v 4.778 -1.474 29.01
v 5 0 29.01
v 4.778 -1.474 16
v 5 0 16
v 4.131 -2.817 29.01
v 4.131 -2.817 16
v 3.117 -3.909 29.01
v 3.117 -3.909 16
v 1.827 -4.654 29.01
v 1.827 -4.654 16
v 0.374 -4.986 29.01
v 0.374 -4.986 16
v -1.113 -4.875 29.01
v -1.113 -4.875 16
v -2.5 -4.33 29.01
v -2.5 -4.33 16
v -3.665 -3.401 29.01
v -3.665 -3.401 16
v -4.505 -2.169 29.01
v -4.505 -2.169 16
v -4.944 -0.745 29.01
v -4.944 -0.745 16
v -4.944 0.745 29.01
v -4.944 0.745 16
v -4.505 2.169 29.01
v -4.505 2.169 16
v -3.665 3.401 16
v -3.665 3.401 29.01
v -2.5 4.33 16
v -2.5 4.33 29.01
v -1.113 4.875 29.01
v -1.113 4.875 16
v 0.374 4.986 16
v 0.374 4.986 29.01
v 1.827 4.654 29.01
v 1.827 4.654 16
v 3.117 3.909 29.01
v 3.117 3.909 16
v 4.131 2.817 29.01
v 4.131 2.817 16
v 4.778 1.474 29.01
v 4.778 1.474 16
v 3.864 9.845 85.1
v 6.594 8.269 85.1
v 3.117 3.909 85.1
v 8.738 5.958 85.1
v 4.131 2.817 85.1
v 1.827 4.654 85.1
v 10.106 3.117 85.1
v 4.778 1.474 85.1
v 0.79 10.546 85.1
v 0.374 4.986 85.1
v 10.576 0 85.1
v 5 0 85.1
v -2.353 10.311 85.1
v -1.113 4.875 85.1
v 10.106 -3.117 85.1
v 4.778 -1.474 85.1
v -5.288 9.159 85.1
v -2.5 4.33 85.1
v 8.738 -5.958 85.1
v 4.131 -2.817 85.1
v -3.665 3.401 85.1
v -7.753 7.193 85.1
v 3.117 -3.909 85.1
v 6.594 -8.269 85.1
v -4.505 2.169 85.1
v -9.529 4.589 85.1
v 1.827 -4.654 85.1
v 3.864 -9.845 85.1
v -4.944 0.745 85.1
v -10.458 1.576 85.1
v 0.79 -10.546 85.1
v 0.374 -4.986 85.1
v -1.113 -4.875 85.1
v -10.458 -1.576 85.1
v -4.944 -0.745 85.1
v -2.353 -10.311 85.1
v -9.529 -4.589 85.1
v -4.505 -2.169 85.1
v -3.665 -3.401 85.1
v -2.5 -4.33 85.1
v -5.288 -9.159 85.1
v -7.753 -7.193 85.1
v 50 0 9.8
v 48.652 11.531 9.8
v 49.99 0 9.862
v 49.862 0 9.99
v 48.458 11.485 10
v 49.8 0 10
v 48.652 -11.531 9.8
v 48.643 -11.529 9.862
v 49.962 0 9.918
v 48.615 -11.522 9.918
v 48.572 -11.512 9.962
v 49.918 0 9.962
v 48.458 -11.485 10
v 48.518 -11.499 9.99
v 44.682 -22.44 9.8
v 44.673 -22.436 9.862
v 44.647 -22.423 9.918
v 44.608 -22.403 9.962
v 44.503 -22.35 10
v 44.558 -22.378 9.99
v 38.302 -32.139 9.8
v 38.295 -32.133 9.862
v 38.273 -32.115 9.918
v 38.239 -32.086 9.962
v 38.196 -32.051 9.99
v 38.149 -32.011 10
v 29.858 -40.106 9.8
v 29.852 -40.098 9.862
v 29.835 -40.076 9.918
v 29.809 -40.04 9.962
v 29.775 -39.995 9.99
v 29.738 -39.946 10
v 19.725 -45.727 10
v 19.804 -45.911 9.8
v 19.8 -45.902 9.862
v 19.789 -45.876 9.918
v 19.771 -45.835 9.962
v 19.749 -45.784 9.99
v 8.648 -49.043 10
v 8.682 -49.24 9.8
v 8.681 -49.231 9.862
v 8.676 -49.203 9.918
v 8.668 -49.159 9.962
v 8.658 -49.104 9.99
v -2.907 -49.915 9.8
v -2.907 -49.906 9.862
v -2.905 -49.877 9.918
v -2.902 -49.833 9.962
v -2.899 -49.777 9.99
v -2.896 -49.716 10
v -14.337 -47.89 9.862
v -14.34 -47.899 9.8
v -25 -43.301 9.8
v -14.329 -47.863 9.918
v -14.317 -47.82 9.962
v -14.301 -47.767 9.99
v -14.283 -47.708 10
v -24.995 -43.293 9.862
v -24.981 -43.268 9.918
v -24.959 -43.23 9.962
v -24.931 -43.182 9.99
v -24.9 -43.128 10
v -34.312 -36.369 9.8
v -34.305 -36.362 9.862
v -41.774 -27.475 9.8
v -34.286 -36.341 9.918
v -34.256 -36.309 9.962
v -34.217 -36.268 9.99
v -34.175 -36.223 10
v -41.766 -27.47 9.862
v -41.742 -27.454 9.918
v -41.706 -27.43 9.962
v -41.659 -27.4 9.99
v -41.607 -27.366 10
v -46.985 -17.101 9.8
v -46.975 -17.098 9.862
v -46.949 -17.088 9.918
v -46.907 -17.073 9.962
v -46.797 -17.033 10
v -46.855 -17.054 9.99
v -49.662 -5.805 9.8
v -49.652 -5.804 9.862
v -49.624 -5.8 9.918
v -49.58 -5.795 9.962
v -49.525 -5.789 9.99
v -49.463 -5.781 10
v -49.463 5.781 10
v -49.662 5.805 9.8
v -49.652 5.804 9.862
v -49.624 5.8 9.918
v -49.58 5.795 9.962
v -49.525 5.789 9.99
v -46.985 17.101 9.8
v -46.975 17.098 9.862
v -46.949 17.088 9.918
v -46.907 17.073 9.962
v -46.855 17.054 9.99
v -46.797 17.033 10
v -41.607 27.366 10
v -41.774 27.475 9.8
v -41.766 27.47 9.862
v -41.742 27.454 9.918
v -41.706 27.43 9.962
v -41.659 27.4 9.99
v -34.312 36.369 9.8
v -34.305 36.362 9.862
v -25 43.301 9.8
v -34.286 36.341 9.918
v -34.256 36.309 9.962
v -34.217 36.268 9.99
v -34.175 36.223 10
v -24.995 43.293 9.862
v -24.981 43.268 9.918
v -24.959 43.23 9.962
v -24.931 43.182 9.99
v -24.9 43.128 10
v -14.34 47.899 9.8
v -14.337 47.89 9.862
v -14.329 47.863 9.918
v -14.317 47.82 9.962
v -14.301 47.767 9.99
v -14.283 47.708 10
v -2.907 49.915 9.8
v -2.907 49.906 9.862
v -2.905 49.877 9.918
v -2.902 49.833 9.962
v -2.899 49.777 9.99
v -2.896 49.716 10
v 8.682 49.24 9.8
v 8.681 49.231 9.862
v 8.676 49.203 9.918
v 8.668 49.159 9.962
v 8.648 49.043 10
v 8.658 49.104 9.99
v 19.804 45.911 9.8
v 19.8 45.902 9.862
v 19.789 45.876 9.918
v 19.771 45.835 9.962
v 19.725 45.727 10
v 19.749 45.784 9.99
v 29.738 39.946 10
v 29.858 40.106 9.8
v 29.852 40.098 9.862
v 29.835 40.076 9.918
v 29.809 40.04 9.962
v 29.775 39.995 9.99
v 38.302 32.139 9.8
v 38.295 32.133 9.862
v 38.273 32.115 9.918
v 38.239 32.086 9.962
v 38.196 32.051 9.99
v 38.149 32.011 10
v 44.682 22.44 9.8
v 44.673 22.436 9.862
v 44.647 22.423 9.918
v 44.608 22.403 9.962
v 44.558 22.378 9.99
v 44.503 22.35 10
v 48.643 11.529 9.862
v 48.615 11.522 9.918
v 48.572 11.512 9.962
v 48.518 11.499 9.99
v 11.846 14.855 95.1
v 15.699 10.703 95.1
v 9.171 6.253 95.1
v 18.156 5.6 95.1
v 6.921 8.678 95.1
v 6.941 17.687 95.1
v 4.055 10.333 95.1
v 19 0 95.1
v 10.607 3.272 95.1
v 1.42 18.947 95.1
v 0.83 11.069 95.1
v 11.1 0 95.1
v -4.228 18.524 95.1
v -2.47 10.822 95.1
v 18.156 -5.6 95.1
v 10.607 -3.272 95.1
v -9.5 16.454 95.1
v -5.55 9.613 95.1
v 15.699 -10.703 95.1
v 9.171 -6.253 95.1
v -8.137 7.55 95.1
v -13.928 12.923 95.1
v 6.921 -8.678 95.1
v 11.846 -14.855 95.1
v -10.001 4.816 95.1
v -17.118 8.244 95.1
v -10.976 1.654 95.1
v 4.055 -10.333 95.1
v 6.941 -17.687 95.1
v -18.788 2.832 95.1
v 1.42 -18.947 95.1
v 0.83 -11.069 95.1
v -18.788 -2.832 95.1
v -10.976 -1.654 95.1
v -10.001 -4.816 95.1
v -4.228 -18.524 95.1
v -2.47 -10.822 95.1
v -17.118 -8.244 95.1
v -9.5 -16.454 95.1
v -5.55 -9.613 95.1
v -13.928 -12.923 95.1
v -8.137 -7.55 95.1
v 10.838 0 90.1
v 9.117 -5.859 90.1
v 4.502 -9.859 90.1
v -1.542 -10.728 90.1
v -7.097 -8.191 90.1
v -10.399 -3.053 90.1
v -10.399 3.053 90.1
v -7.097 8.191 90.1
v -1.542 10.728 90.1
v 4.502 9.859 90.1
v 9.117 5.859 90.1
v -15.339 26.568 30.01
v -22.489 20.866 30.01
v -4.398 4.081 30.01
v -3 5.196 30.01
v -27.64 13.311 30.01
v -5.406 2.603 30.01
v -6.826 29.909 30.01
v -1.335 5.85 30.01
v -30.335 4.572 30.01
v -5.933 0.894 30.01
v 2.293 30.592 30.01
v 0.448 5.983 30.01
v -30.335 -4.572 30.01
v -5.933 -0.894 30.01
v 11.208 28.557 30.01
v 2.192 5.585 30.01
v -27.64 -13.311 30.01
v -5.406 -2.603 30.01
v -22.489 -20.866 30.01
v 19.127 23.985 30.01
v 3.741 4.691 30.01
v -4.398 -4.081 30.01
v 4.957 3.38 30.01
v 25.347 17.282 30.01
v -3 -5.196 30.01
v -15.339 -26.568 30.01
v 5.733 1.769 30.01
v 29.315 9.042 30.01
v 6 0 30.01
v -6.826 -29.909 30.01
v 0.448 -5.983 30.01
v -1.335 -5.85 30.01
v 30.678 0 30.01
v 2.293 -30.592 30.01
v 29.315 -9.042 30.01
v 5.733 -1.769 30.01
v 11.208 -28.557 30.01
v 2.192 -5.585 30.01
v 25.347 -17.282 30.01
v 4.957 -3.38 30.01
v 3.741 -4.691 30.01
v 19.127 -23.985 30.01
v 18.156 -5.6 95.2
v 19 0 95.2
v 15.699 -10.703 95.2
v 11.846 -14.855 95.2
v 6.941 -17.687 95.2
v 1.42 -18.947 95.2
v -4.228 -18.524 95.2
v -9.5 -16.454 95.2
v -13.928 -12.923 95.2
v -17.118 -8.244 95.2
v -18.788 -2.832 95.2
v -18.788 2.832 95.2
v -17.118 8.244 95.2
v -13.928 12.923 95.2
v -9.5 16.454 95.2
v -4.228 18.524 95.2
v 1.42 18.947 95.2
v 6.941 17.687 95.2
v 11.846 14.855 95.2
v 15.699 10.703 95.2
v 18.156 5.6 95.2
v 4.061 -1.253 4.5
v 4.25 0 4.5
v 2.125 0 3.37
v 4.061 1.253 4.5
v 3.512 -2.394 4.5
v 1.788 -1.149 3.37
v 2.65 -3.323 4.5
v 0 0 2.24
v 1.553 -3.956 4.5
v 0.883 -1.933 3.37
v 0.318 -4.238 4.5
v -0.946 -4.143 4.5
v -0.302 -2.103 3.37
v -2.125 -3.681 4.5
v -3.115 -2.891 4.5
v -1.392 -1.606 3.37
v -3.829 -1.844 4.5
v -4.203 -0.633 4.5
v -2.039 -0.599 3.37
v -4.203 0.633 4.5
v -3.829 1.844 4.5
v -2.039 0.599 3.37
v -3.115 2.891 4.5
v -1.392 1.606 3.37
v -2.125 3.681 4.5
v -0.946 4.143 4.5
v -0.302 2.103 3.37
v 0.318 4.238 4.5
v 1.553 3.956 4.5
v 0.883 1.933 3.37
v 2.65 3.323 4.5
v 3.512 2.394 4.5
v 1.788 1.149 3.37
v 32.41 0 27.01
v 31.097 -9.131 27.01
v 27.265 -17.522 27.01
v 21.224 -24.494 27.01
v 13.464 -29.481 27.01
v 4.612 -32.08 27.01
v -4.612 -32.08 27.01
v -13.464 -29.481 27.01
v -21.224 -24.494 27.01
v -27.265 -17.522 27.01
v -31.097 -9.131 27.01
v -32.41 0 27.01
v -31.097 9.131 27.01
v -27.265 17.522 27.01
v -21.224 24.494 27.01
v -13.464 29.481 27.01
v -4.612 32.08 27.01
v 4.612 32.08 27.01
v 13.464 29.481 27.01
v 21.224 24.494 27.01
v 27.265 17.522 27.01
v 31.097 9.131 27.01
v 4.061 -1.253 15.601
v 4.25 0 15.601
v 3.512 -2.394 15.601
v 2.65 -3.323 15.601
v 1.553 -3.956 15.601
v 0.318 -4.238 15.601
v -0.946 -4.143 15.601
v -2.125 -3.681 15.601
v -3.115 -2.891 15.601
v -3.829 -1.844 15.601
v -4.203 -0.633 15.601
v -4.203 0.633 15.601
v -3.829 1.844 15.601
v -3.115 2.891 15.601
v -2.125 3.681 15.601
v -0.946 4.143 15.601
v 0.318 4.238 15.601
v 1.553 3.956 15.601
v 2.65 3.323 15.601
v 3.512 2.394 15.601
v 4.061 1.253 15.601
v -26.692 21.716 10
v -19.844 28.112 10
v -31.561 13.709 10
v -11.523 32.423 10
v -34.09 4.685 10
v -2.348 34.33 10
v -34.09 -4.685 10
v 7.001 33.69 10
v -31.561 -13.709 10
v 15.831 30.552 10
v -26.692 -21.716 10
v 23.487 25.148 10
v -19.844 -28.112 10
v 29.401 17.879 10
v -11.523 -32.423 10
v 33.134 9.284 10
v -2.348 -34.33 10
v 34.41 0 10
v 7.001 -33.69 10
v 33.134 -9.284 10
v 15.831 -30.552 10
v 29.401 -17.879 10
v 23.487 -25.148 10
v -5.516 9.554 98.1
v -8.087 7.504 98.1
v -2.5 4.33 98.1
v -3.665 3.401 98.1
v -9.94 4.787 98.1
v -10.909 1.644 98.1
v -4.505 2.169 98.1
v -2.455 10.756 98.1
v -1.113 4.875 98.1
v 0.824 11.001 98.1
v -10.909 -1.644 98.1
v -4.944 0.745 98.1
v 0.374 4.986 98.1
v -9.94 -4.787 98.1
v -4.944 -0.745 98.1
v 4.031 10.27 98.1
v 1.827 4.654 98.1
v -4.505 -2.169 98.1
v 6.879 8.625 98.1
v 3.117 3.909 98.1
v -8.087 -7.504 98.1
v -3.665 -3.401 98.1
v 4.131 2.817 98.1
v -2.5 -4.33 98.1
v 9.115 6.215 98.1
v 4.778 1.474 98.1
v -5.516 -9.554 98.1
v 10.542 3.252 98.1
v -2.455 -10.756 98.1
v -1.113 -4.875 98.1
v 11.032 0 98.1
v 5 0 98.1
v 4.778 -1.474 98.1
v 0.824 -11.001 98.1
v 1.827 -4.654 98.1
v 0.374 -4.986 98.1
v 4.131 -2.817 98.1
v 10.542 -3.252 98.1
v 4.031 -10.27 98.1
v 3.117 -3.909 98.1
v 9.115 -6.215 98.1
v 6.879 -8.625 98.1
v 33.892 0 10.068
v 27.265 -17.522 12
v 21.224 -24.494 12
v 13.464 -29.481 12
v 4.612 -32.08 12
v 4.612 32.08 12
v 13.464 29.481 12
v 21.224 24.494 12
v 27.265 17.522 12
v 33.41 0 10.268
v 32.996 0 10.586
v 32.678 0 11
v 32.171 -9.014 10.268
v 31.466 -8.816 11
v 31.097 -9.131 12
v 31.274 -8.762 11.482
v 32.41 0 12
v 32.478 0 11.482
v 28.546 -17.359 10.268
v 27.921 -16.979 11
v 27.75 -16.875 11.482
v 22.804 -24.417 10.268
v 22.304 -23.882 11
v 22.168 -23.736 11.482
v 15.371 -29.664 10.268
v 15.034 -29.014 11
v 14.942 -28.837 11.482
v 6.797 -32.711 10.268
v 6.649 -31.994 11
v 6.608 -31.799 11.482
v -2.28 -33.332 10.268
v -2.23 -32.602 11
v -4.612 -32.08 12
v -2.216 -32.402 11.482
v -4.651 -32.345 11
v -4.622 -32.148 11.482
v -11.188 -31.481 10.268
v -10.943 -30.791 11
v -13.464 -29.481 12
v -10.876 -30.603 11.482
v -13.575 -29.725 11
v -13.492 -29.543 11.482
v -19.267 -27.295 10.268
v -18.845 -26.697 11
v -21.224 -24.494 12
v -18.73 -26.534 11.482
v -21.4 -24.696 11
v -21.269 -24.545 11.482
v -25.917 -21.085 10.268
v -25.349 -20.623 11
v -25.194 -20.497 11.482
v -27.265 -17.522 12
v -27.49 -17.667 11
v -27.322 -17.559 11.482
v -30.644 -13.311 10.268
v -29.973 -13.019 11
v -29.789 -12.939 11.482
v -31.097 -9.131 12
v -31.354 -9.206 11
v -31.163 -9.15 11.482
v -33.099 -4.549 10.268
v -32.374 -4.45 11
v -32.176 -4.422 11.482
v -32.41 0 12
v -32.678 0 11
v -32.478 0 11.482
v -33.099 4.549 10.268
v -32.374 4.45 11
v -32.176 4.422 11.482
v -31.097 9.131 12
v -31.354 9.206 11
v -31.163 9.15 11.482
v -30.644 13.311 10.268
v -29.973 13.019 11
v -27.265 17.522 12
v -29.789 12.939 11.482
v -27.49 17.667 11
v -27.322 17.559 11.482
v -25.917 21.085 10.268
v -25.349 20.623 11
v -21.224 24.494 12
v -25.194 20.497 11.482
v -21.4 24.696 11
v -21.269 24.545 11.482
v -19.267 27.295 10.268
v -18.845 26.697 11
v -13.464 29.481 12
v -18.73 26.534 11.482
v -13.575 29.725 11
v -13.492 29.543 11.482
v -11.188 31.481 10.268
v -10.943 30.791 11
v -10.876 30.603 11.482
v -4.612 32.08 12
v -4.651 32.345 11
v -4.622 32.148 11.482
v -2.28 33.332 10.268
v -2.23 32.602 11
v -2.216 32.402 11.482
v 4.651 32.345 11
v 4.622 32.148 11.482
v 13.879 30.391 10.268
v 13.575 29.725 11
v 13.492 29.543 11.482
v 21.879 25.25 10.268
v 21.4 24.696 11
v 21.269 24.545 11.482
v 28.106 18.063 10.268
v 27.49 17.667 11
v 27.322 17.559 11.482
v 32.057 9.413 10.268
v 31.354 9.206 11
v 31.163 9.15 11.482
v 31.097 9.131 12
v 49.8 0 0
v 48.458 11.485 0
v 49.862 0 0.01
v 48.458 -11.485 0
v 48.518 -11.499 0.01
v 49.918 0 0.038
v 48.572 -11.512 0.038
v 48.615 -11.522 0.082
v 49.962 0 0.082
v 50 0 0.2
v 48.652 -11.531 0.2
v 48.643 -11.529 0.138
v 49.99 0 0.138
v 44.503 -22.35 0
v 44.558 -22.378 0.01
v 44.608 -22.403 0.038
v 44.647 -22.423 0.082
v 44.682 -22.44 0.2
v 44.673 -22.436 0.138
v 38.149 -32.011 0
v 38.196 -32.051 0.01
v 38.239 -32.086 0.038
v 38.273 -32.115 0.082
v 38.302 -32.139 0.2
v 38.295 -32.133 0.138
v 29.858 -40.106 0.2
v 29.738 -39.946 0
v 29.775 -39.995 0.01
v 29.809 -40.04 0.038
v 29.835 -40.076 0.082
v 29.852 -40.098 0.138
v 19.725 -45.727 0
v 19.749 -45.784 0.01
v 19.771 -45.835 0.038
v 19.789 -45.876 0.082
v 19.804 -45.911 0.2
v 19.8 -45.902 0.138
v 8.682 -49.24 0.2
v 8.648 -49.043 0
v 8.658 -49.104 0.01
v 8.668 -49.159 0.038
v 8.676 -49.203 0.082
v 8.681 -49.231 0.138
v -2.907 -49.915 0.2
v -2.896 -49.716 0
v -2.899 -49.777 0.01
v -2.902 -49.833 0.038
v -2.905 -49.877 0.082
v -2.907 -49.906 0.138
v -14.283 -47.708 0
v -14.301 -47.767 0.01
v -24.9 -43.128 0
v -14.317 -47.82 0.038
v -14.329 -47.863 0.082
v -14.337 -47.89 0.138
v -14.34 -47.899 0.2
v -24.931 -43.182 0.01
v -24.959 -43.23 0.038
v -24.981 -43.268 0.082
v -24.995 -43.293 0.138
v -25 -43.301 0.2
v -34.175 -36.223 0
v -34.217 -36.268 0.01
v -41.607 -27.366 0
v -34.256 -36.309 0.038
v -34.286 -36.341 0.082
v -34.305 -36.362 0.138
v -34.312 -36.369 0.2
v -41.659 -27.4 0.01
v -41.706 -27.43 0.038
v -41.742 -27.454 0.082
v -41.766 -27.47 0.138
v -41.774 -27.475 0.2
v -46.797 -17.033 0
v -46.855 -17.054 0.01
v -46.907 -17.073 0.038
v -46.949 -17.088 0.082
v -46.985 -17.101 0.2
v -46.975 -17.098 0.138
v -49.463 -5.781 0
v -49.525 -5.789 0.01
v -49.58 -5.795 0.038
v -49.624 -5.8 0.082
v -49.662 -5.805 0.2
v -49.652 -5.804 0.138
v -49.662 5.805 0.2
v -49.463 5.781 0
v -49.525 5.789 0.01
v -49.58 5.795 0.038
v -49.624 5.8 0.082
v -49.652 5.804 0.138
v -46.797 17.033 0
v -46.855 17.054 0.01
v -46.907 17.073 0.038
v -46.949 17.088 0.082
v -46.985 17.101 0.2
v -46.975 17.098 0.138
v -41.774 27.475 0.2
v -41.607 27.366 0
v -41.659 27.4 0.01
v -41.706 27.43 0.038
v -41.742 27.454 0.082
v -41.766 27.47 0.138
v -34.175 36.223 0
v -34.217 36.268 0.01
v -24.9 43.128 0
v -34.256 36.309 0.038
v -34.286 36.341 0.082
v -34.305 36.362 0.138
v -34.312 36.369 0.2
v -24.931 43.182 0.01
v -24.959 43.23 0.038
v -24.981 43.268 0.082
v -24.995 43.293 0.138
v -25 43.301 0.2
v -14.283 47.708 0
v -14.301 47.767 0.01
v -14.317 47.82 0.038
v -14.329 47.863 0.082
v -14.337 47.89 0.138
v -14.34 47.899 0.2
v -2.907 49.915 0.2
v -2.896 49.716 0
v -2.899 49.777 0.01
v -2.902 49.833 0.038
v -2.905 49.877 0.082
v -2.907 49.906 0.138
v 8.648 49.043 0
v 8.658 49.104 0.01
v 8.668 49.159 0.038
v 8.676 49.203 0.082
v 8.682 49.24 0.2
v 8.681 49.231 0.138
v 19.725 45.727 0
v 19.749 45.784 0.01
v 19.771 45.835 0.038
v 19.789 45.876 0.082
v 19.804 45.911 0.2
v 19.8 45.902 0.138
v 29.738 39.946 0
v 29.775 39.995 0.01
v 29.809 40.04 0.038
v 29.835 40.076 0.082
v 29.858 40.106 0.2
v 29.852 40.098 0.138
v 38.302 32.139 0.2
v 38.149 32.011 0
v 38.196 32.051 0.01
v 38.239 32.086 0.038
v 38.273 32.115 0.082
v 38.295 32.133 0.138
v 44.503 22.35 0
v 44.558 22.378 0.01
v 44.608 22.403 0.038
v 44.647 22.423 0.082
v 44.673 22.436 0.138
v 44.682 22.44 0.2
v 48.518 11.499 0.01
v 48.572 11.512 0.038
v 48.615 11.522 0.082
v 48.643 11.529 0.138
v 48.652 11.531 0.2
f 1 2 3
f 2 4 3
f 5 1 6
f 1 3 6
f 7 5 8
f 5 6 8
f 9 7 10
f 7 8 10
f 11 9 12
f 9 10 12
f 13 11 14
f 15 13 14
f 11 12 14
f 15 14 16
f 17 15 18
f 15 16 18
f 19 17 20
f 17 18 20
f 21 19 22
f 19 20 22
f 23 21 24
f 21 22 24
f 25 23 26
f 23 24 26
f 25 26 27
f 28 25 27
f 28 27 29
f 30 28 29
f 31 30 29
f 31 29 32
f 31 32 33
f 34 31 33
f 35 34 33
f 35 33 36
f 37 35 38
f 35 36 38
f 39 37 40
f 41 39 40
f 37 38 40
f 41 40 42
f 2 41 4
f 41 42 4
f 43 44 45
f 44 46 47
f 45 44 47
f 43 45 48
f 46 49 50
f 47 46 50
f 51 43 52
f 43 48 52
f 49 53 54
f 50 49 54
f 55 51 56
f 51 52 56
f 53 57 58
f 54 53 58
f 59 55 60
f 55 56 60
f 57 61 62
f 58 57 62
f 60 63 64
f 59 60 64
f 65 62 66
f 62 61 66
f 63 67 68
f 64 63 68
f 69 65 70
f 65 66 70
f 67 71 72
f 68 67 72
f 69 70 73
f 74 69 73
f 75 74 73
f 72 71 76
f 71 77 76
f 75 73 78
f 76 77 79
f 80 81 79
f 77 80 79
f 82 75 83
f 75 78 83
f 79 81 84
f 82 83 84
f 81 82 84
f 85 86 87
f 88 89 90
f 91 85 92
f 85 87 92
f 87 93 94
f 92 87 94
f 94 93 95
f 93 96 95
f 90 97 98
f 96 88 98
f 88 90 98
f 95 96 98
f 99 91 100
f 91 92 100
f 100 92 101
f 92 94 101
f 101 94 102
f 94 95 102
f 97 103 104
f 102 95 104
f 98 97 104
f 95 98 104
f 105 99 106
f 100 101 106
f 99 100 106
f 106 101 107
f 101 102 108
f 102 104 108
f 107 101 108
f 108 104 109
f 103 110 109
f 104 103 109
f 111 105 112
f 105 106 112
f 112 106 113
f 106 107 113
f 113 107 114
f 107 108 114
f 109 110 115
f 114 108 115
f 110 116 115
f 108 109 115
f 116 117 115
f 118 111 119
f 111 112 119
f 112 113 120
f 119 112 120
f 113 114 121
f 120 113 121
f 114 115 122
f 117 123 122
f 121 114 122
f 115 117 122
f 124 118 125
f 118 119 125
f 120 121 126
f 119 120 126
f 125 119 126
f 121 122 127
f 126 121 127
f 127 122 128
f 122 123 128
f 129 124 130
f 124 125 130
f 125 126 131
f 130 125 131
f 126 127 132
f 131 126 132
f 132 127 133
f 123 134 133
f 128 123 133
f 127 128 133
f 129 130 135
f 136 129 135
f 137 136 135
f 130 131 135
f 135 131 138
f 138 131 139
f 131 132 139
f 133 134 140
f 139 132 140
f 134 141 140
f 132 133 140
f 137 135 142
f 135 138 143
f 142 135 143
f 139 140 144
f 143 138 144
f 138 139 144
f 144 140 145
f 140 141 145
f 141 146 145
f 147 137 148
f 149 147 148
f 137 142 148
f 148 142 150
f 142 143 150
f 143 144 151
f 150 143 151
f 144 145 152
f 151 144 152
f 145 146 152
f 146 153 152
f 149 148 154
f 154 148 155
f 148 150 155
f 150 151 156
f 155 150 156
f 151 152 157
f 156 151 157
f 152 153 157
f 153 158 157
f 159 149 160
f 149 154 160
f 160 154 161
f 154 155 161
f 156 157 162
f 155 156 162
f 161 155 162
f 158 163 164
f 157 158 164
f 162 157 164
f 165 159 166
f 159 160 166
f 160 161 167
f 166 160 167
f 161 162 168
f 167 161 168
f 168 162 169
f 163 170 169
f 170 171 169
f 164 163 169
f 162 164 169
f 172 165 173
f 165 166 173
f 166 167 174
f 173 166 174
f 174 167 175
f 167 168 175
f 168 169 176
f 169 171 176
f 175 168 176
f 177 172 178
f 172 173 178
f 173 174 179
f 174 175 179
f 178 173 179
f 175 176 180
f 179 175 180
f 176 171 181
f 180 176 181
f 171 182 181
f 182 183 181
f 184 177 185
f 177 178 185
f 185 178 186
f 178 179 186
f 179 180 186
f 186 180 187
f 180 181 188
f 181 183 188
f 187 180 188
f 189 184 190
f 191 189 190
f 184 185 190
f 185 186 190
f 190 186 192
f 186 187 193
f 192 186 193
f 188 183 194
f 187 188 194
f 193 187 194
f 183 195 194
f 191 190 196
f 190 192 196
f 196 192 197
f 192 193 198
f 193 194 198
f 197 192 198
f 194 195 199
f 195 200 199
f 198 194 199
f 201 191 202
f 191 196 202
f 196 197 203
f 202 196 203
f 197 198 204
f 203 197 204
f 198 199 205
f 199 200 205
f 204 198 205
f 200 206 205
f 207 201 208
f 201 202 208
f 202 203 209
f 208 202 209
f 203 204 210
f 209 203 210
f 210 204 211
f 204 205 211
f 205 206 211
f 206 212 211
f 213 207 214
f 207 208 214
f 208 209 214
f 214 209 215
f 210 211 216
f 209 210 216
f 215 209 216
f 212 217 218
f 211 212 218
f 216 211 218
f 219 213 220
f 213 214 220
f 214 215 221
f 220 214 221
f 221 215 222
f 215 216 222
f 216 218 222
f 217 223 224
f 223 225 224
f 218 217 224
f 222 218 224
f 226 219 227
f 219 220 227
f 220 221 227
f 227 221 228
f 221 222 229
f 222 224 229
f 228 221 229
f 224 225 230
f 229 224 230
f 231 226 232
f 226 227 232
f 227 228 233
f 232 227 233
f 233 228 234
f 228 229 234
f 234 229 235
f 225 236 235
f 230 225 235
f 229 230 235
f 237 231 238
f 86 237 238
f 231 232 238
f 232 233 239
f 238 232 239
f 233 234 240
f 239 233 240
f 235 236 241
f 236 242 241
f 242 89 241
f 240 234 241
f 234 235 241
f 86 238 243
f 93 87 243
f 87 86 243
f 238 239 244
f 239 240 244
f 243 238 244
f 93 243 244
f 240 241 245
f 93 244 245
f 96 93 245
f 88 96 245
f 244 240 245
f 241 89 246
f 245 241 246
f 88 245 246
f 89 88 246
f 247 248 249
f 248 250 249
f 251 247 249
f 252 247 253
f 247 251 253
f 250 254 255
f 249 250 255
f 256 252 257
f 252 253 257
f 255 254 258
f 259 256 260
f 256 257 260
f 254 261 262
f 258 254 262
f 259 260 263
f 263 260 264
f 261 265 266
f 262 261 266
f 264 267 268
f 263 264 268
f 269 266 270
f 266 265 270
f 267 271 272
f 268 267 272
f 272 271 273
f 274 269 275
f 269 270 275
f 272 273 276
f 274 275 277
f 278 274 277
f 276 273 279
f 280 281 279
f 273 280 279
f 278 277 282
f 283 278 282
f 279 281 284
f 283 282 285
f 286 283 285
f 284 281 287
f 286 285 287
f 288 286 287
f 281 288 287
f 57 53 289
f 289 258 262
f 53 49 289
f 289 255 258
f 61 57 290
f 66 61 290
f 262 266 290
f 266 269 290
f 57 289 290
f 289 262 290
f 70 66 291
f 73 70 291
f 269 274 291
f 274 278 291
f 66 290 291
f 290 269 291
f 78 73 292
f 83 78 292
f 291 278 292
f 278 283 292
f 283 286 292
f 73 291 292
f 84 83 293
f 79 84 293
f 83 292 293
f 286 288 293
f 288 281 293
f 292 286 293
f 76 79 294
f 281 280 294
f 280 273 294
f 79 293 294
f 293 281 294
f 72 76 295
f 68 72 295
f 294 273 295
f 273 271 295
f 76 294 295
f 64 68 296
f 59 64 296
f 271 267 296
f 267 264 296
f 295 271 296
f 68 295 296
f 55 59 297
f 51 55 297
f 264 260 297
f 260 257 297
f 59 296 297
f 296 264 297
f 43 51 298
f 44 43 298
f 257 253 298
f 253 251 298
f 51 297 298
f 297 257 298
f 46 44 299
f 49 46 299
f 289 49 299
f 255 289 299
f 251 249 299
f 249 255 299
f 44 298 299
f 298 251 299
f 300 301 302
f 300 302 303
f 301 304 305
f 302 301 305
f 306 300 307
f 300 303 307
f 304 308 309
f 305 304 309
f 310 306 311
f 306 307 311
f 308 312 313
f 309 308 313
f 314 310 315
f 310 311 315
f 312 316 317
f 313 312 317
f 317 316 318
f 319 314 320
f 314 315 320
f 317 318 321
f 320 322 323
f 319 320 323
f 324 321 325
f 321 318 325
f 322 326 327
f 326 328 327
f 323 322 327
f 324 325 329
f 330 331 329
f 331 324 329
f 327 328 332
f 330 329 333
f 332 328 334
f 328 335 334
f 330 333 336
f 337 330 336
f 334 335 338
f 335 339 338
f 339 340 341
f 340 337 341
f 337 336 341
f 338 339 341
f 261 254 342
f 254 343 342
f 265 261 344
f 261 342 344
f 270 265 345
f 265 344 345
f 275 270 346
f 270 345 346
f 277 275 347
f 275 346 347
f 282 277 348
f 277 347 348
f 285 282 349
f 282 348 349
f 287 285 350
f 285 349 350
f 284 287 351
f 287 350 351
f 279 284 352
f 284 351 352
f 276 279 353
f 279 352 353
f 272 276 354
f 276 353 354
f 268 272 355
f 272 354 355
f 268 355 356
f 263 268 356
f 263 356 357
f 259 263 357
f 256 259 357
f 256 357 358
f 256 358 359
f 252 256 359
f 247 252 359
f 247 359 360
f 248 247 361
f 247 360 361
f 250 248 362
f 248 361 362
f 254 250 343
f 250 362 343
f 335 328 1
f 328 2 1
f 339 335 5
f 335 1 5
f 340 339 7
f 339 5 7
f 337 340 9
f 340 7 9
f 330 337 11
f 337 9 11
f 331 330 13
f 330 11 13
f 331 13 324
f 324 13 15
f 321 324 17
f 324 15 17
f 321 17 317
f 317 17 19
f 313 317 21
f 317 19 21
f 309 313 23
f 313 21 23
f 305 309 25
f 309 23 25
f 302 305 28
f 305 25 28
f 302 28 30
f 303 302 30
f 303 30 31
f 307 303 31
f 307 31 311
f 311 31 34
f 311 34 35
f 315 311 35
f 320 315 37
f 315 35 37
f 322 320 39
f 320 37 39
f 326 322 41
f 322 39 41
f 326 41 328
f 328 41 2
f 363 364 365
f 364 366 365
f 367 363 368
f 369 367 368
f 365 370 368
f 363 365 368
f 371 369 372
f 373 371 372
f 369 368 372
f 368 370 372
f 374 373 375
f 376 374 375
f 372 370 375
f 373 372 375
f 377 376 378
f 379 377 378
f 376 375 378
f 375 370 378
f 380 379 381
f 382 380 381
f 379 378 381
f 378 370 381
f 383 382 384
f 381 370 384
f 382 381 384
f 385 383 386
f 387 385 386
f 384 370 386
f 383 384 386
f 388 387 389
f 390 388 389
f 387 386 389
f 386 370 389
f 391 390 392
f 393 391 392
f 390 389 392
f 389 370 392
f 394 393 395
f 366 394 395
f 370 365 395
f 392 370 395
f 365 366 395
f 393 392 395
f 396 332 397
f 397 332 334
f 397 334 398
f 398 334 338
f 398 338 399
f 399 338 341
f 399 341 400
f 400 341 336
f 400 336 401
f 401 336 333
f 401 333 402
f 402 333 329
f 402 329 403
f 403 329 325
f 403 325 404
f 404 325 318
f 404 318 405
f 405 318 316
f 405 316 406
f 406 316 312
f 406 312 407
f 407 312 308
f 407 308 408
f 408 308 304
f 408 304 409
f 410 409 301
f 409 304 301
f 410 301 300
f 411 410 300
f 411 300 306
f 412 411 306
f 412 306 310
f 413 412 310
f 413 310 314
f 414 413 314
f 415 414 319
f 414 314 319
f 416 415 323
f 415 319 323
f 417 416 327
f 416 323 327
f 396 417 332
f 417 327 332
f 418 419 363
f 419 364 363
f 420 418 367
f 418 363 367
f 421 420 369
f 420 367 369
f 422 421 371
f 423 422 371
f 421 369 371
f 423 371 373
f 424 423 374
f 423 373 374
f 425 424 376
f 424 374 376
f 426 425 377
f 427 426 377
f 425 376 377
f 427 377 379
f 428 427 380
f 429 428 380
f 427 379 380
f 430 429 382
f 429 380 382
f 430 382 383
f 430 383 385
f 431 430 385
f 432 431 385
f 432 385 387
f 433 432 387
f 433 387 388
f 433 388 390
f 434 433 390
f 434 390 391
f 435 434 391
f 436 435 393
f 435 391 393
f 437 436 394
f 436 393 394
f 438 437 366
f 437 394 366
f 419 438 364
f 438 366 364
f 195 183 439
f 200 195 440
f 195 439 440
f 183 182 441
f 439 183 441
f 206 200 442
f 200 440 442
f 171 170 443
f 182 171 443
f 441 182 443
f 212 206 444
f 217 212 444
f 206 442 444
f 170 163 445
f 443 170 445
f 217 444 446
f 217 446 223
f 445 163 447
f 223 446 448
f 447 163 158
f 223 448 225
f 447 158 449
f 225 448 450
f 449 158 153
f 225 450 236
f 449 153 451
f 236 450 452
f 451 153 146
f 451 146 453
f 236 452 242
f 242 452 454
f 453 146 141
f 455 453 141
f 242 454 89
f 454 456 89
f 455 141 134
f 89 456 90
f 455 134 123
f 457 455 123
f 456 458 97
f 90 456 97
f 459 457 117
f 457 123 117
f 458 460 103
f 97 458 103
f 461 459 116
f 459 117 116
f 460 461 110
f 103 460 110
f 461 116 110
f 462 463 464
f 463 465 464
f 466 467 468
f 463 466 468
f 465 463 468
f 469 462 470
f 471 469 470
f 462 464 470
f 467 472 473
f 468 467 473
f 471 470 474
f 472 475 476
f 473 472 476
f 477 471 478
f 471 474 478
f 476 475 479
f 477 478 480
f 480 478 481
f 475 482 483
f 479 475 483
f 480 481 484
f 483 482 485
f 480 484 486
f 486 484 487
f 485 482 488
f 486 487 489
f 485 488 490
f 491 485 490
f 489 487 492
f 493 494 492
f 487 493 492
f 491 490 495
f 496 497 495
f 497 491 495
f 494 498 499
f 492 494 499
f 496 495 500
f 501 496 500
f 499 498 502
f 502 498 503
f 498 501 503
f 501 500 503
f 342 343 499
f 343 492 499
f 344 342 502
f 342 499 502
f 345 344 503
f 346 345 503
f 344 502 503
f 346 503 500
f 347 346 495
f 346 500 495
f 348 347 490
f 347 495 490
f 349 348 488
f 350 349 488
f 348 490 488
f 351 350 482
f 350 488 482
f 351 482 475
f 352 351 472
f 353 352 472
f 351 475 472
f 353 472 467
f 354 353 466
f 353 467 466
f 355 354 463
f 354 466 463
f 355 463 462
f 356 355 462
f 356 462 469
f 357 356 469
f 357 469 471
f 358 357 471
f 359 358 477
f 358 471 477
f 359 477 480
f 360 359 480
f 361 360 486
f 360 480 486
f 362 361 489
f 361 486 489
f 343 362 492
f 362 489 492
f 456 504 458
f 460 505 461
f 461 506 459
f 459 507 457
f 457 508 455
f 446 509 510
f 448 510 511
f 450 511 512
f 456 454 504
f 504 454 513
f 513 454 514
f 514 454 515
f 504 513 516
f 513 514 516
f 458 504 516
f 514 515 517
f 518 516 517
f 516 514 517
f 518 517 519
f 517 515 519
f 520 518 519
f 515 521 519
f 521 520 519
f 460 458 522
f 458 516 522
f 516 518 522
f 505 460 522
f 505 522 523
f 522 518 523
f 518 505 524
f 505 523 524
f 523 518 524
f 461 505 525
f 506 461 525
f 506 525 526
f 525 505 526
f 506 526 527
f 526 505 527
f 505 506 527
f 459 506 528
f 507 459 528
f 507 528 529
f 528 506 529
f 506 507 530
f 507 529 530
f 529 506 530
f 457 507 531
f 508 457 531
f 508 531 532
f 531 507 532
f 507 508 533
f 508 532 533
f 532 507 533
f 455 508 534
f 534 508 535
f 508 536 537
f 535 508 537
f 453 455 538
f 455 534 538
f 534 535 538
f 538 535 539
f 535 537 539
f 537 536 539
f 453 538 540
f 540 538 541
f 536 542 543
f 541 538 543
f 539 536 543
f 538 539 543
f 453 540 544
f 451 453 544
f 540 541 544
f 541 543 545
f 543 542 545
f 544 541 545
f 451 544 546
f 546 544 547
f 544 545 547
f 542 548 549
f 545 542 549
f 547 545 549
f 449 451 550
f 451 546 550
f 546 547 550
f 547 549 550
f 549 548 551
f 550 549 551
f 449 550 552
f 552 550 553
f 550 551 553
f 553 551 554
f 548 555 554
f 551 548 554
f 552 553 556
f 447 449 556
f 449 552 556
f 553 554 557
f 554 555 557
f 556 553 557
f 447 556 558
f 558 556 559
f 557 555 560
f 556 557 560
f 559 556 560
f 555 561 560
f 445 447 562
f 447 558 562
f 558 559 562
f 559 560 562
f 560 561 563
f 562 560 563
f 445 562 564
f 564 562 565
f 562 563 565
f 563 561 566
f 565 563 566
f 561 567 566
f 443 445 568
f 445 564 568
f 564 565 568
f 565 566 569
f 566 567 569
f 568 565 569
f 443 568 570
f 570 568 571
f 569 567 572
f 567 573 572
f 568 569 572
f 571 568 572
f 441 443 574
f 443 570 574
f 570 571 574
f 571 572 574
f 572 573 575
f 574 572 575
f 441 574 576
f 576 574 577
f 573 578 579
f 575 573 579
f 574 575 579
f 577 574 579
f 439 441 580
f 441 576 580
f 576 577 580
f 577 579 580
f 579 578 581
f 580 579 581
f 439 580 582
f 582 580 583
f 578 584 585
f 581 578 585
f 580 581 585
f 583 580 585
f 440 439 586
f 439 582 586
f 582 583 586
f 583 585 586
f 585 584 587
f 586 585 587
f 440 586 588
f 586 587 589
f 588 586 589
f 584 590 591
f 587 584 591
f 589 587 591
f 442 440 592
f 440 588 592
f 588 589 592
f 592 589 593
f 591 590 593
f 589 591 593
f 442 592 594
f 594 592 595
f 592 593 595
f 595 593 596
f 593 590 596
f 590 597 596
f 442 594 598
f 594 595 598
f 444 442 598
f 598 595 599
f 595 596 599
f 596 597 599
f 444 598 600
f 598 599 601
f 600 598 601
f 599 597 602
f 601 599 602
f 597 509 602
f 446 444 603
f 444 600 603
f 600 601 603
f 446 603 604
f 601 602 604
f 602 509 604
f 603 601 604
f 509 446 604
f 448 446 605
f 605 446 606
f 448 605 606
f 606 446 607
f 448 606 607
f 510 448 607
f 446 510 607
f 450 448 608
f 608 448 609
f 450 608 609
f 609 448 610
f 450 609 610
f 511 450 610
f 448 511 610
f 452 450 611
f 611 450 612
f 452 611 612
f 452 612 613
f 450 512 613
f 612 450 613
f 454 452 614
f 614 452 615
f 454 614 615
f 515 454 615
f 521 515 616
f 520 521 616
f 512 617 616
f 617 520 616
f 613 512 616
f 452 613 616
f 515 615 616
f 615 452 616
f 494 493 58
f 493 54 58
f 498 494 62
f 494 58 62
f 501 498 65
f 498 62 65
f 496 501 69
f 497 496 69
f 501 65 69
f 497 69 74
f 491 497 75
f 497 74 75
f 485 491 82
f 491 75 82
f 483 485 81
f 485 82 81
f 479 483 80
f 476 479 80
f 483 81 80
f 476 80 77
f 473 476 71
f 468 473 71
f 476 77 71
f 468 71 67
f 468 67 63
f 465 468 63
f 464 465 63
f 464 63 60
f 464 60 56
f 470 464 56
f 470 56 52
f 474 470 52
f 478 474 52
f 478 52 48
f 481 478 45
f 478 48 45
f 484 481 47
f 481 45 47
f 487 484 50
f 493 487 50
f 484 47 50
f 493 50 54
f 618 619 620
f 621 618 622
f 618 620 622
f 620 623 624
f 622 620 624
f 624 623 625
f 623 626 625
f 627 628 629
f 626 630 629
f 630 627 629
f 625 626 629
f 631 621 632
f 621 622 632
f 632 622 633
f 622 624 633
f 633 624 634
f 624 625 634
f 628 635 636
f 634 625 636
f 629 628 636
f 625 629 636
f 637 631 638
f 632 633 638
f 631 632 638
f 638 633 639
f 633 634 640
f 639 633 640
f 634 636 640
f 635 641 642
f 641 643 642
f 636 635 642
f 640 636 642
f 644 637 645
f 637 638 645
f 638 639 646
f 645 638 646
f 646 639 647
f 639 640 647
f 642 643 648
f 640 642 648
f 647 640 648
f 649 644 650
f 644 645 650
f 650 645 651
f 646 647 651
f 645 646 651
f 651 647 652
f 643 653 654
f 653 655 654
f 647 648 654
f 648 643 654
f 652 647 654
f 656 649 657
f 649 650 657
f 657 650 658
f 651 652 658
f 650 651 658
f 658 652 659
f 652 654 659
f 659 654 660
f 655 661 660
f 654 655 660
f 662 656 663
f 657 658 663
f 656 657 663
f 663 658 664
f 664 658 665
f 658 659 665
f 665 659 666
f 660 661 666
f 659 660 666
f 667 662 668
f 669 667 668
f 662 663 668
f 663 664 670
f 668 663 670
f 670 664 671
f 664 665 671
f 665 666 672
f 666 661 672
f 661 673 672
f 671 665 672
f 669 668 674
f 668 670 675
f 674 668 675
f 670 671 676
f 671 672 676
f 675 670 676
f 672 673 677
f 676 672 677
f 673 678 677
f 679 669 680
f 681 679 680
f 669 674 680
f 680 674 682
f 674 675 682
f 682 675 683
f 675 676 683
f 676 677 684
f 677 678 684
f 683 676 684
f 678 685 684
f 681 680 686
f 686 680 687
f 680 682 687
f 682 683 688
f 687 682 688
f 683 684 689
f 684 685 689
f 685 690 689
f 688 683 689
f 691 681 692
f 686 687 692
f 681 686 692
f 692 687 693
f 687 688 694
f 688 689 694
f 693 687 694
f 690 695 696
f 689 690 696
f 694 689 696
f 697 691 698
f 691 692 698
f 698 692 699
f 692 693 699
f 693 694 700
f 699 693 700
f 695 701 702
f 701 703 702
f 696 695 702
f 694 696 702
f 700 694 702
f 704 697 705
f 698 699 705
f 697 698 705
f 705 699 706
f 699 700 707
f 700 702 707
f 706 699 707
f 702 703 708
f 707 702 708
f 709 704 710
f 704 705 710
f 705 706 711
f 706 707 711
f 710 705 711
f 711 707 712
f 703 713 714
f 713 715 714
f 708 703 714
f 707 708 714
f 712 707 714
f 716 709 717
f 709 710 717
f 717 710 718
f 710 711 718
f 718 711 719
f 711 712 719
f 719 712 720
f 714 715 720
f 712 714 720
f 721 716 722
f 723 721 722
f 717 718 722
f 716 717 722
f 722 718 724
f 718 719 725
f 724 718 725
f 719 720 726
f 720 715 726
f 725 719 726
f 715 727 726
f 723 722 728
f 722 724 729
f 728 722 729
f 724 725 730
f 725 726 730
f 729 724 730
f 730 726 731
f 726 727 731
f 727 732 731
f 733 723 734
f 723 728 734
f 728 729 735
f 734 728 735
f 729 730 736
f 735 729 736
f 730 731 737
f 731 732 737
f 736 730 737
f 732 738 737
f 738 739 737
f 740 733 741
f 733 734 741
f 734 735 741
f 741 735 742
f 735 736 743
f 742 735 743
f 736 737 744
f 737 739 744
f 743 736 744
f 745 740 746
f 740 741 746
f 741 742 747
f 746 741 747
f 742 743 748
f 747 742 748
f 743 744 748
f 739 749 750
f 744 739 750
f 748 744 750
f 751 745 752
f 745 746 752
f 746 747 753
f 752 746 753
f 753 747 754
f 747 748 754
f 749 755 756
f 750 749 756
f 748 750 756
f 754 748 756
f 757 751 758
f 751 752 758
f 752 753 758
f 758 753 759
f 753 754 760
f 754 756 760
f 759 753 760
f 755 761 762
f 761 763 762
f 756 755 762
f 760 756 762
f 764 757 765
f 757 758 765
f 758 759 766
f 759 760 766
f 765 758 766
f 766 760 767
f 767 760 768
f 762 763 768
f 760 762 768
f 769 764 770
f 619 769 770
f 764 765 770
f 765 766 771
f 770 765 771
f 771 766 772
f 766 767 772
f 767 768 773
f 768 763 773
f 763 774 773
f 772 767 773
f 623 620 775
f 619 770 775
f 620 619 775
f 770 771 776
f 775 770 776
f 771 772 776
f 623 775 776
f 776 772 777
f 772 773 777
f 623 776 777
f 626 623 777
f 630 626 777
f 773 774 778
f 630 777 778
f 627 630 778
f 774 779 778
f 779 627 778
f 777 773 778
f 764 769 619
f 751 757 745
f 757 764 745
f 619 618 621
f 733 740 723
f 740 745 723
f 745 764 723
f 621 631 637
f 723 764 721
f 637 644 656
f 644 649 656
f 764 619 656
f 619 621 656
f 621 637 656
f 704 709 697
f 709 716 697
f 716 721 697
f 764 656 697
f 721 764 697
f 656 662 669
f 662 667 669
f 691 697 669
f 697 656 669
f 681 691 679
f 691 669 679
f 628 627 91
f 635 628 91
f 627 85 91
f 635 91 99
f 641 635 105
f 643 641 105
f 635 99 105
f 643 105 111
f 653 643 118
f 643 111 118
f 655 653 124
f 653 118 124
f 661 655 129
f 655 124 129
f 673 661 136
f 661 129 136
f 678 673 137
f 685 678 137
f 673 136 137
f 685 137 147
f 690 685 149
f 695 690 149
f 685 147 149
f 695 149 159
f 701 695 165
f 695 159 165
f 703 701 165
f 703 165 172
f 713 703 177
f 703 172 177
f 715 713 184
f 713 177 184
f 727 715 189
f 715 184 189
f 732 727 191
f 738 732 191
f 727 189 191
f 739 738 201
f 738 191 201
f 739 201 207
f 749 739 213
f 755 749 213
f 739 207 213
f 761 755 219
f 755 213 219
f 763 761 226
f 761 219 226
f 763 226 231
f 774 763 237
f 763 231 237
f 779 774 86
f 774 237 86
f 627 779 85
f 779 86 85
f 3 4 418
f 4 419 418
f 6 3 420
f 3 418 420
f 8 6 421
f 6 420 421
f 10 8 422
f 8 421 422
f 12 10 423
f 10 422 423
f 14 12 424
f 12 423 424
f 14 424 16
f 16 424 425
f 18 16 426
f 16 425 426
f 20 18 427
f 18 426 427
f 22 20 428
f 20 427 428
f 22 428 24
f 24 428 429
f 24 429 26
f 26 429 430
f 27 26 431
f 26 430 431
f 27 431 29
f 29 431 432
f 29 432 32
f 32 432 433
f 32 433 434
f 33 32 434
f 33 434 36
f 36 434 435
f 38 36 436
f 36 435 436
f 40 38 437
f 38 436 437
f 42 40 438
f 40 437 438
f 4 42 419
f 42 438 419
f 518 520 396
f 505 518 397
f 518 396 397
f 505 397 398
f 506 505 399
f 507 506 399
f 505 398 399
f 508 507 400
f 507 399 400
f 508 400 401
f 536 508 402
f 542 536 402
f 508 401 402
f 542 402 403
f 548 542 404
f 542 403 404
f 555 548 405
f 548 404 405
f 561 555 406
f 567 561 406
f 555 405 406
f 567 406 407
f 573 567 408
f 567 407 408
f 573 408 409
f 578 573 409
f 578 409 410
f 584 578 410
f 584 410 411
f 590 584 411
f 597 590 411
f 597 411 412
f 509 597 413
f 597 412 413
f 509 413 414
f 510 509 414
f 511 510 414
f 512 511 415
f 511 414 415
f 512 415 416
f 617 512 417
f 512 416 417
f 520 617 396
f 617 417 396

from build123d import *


with BuildPart() as f1:
    # F0 (on Front) → F1 (revolve)
    with BuildSketch(Plane.XZ):
        with BuildLine():
            Line((4.25, 4.5), (0, 2.240235))
            Line((0, 2.240235), (0, 0))
            Line((0, 0), (49.8, 0))
            ThreePointArc((49.8, 0), (49.941421, 0.058579), (50, 0.2))
            Line((50, 0.2), (50, 9.8))
            ThreePointArc((50, 9.8), (49.941421, 9.941421), (49.8, 10))
            Line((49.8, 10), (34.41, 10))
            ThreePointArc((34.41, 10), (32.995786, 10.585786), (32.41, 12))
            Line((32.41, 12), (32.41, 27.01))
            Line((32.41, 27.01), (30.677949, 30.01))
            Line((30.677949, 30.01), (6, 30.01))
            Line((6, 30.01), (5, 29.01))
            Line((5, 29.01), (5, 16))
            Line((5, 16), (4.25, 15.601218))
            Line((4.25, 15.601218), (4.25, 4.5))
        make_face()
        Polygon((5, 98.1), (5, 85.1), (10.575922, 85.1), (11.1, 95.1), (19, 95.1), (19, 95.2), (11.032315, 98.1), align=None)
    revolve(axis=Axis((0, 0, 0), (0, 0, -1)))


solid = f1.part
